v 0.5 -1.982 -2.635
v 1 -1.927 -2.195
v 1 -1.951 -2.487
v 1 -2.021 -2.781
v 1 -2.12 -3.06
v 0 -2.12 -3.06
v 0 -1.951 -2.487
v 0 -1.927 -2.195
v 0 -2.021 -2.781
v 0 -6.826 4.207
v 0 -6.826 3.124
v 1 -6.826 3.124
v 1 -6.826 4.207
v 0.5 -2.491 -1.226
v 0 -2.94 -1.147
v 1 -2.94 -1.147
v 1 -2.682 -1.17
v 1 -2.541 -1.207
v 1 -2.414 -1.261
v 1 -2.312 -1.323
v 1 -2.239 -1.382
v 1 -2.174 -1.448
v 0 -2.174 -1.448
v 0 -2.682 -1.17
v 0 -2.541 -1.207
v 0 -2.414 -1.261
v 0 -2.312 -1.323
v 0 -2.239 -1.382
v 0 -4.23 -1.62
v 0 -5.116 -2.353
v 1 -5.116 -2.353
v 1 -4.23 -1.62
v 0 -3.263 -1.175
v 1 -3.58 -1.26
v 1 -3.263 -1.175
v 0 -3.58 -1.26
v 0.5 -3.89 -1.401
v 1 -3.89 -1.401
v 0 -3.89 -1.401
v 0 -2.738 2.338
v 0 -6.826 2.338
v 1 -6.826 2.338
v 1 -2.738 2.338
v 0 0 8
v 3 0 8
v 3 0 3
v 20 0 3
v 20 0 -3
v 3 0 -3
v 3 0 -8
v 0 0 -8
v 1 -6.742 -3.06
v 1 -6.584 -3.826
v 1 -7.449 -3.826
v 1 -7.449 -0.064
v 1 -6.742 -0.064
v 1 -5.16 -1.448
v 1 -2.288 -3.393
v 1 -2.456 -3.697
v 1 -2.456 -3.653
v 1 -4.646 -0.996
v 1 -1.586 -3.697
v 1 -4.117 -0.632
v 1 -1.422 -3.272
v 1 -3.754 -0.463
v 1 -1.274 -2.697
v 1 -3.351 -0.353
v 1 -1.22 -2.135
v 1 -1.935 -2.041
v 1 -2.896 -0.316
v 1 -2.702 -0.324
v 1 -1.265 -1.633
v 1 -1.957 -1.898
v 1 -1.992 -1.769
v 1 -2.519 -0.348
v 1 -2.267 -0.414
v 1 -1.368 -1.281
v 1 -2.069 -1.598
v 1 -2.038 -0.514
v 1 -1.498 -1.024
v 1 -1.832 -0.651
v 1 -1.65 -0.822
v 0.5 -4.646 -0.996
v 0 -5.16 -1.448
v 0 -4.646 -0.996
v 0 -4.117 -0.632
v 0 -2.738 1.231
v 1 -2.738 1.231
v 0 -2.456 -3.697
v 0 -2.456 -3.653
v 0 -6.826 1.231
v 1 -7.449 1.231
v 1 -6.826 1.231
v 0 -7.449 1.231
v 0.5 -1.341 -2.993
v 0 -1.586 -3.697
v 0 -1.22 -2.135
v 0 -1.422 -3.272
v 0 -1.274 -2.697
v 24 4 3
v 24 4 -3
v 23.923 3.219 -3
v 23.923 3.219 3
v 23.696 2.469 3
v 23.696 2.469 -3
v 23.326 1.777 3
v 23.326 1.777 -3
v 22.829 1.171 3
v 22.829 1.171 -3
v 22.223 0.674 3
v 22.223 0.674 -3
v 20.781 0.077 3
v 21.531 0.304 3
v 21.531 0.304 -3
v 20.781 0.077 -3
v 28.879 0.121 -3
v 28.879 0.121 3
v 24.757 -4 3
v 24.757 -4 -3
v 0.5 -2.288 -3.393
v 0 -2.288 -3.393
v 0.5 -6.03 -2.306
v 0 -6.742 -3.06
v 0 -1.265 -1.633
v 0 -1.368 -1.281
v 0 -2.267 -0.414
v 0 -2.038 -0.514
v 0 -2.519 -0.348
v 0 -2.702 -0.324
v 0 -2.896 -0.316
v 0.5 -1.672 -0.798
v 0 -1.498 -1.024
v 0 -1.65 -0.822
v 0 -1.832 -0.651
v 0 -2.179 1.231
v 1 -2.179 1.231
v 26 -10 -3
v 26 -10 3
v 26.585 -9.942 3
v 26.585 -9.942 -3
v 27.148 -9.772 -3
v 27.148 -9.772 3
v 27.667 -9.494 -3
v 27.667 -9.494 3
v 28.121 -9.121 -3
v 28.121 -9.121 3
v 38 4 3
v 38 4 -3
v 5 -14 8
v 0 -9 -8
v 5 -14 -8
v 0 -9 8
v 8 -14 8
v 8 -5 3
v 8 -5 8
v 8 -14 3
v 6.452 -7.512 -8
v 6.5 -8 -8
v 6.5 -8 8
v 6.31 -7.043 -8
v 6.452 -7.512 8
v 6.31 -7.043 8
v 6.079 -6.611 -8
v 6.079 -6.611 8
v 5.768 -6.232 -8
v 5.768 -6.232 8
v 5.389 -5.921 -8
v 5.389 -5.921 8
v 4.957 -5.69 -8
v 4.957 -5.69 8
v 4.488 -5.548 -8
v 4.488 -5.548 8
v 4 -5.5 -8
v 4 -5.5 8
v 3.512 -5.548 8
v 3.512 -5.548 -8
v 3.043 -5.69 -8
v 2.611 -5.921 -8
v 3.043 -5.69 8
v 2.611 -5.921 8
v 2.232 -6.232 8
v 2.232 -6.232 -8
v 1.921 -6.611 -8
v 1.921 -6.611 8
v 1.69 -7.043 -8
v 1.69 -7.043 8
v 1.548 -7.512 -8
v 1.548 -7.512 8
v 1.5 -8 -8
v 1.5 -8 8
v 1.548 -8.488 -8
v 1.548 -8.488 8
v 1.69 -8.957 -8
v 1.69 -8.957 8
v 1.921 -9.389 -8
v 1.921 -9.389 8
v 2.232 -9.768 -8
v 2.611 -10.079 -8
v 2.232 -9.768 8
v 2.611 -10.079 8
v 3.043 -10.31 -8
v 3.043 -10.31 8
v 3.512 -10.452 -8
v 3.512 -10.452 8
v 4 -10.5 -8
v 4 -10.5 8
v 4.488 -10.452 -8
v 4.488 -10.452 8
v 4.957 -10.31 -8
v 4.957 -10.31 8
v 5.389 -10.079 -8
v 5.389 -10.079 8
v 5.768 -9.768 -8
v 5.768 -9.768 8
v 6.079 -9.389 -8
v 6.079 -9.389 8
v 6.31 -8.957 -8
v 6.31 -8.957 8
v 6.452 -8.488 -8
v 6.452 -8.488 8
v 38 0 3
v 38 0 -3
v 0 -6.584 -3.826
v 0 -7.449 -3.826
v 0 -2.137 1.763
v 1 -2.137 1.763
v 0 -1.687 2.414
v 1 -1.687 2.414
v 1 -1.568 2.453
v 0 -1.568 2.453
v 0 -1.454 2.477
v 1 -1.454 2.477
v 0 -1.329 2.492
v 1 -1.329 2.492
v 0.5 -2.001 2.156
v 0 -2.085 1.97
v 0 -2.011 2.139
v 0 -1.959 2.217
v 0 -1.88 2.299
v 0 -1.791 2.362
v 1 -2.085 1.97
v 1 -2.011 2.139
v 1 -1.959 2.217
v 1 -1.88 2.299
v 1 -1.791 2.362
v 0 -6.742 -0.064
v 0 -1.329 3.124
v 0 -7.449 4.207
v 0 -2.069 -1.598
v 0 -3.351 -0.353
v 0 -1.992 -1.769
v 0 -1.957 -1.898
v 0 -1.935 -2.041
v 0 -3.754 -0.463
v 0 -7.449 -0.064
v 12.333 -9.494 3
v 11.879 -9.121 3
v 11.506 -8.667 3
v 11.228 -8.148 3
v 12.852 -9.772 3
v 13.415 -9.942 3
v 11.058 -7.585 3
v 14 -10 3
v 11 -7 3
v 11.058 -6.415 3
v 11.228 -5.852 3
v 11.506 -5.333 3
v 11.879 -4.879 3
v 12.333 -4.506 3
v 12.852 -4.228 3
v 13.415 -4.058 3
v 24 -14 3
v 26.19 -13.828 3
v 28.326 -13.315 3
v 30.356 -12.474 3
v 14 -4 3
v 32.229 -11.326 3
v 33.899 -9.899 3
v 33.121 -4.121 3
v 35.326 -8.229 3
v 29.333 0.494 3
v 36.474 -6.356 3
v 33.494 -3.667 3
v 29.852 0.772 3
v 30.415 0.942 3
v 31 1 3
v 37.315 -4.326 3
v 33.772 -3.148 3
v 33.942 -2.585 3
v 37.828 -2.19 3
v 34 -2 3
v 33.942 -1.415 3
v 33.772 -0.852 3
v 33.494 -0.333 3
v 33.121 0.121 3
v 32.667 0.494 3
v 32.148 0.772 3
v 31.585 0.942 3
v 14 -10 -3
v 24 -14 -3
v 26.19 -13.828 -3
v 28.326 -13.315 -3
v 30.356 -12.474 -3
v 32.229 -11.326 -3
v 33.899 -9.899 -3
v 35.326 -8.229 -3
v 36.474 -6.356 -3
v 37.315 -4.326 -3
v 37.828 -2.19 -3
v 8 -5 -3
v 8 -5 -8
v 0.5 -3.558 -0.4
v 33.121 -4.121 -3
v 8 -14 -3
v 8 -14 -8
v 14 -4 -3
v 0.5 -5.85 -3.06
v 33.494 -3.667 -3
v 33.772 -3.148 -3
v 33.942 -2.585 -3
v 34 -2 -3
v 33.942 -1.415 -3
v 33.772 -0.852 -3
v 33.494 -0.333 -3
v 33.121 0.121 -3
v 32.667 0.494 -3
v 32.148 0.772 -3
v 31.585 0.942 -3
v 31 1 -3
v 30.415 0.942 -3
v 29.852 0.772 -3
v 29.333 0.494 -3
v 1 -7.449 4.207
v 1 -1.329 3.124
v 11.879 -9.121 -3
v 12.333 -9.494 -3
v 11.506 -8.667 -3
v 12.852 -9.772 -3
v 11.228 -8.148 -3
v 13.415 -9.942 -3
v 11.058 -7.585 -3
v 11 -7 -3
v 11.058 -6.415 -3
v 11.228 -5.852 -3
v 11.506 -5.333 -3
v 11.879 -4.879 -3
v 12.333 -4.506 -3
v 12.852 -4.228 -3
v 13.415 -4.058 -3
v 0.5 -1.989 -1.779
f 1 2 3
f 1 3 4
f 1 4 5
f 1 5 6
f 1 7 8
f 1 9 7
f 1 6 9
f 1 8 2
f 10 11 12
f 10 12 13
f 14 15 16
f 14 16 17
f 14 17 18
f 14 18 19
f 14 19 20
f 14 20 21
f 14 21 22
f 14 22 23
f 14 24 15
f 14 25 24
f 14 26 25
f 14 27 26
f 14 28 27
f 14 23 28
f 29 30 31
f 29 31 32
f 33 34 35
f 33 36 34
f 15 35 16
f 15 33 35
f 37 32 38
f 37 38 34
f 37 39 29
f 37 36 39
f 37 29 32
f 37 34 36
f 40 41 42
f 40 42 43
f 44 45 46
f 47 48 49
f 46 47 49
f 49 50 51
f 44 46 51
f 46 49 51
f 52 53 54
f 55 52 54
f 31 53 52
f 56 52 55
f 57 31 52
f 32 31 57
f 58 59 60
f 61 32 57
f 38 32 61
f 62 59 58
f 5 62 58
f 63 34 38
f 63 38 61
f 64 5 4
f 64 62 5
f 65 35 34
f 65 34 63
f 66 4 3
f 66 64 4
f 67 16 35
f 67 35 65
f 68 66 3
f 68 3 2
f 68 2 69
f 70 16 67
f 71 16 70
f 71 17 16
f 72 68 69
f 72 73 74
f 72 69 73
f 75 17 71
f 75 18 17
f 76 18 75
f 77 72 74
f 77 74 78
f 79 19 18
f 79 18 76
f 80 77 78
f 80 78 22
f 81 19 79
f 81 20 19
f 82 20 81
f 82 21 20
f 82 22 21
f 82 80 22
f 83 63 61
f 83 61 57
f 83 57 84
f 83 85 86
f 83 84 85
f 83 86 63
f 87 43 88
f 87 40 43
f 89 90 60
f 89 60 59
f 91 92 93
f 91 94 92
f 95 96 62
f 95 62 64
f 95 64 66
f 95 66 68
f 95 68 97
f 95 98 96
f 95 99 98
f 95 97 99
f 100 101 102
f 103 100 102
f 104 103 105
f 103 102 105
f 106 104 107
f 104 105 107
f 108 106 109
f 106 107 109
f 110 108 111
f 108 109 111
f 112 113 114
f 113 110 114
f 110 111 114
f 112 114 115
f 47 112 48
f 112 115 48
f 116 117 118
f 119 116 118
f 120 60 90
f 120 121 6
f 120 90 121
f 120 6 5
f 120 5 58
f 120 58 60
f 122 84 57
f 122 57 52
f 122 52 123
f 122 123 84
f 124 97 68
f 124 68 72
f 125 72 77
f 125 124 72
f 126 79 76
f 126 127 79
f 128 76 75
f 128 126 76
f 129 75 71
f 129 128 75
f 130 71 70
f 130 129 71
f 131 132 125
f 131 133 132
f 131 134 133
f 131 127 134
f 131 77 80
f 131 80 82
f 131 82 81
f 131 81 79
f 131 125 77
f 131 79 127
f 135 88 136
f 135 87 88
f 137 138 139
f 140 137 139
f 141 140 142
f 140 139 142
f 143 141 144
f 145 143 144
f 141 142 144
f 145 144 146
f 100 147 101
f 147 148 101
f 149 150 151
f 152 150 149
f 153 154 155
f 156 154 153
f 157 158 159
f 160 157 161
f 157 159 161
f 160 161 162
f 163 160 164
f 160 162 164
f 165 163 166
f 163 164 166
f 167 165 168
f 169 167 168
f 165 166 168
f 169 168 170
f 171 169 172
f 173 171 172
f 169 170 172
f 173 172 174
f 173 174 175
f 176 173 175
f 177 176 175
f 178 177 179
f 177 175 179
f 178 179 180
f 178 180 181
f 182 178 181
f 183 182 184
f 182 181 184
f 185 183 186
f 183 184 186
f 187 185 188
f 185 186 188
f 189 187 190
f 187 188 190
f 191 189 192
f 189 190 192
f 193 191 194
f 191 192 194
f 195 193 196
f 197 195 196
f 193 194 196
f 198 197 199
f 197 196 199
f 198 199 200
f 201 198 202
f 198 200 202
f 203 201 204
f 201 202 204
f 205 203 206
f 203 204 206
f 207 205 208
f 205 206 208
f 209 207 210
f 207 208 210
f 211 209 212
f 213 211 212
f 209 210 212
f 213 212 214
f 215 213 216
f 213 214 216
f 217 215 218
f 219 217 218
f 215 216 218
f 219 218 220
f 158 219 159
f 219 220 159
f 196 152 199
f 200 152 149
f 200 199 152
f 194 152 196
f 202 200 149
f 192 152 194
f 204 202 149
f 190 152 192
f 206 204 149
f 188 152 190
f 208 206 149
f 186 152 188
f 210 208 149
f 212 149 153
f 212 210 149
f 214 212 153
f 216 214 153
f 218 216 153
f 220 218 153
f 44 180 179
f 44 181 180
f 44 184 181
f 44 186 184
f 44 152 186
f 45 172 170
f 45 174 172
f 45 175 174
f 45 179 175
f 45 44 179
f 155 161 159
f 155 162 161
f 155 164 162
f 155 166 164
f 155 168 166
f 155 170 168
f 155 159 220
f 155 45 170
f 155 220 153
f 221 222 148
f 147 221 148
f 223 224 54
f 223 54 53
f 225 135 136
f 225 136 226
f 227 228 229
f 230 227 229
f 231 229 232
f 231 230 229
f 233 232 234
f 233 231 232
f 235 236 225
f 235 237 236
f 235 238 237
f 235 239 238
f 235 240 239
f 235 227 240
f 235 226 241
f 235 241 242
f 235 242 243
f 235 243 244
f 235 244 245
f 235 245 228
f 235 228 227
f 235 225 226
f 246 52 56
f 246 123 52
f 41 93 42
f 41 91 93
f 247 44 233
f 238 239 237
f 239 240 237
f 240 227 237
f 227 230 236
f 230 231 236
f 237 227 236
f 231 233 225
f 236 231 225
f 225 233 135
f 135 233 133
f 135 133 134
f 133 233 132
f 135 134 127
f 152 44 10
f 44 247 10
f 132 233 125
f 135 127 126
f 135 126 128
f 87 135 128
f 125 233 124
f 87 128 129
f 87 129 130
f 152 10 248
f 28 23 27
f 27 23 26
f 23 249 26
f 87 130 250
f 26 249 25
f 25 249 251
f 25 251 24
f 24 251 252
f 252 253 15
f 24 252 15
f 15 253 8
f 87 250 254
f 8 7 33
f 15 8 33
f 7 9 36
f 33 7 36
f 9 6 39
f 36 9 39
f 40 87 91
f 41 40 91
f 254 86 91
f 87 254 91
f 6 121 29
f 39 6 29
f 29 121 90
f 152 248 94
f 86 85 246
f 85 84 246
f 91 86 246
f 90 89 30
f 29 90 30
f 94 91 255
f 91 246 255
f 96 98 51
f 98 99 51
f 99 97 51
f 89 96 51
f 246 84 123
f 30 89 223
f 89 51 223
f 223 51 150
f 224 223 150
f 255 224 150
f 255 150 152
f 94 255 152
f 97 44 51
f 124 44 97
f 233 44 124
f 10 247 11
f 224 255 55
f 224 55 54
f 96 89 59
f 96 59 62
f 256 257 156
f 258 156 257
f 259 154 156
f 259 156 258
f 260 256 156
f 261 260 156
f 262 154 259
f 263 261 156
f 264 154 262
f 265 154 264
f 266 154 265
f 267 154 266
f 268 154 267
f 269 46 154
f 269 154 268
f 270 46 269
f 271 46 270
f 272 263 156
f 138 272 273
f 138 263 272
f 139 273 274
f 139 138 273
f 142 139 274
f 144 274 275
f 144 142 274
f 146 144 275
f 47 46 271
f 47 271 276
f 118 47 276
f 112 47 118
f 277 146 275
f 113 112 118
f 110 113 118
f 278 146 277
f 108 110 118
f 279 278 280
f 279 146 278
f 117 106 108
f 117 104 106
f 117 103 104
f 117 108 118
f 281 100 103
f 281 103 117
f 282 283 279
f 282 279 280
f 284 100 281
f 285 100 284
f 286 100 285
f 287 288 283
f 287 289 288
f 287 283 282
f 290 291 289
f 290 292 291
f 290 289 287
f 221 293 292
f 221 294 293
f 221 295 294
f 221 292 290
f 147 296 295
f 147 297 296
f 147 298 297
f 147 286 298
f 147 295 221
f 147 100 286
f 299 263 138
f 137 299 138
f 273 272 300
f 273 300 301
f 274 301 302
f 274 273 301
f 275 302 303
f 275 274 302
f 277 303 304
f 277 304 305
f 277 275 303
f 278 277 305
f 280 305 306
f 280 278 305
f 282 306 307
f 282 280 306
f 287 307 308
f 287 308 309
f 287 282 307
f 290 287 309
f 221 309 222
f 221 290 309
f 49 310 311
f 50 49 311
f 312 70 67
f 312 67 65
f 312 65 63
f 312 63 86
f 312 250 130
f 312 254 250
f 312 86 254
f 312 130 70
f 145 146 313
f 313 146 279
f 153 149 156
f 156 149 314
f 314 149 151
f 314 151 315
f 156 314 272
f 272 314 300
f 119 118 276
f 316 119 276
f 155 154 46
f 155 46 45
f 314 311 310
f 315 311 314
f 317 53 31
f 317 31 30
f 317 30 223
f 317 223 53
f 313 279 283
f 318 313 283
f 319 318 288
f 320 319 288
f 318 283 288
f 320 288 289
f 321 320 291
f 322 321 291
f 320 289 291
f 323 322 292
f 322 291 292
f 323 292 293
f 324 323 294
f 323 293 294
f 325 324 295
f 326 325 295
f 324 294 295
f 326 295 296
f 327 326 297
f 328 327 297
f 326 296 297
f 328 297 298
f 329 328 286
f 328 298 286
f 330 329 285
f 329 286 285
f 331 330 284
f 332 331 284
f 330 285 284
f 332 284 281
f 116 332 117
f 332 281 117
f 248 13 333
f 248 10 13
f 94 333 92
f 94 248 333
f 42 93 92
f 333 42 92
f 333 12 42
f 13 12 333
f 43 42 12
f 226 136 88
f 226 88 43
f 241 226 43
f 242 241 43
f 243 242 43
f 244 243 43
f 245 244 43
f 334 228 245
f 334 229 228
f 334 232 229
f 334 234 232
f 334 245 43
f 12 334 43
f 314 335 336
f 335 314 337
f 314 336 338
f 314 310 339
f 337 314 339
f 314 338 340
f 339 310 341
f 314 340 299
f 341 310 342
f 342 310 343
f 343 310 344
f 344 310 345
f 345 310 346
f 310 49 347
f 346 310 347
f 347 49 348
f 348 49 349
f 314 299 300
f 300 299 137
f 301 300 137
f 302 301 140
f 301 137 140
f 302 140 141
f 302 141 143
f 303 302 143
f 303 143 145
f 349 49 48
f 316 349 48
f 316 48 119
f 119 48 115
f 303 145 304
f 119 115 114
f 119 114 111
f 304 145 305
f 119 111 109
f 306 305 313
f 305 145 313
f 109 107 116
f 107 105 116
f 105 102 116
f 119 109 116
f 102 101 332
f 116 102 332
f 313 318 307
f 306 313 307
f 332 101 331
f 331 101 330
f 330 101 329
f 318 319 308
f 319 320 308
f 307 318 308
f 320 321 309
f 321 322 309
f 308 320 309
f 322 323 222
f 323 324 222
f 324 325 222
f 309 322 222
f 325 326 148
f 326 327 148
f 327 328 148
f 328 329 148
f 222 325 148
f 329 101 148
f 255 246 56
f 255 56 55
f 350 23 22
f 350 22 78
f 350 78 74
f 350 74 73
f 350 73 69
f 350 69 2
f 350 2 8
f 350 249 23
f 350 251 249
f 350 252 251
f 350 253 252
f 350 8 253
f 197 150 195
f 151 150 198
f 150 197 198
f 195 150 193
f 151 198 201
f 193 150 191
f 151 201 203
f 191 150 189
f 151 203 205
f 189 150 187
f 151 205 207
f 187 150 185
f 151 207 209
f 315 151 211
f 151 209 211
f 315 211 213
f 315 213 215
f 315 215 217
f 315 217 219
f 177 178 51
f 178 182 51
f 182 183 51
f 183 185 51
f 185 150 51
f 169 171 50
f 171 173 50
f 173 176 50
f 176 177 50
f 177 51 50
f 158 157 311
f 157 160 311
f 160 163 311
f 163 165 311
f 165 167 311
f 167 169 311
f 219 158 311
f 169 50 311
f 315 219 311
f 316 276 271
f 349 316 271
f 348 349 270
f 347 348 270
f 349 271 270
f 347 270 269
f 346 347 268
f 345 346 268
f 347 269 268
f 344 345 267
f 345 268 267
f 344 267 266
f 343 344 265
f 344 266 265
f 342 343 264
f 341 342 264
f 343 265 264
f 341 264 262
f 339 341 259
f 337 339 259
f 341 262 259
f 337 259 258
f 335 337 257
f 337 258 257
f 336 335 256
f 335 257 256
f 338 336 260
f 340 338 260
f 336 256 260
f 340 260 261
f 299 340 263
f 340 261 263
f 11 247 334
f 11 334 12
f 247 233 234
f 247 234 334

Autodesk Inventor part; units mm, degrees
ref_plane "YZ Plane" through (0, 0, 0) normal (1, 0, 0) x (0, 1, 0)
ref_plane "XZ Plane" through (0, 0, 0) normal (0, 1, 0) x (-1, 0, 0)
ref_plane "XY Plane" through (0, 0, 0) normal (0, 0, 1) x (1, 0, 0)
sketch "스케치1" plane through (0, 0, 0) normal (0, 0, 1) x (1, 0, 0)
  line L0 (0, 0) -> (0, -14)
  line L1 (0, -14) -> (38, -14)
  line L2 (38, -14) -> (38, 4)
  line L3 (38, 4) -> (24, 4)
  line L4 (24, 4) -> (24, 0)
  line L5 (24, 0) -> (0, 0)
  line L6 (8, 0) -> (8, -14)
  dimension "d0" = 18
  dimension "d1" = 38
  dimension "d2" = 14
  dimension "d3" = 14
  dimension "d4" = 8
extrude "돌출1" add sketch "스케치1" along normal mid plane 6 contours L5 L4 L3 L2 L1 L6
extrude "돌출2" add sketch "스케치1" along normal mid plane 16 contours L5 L6 L1 L0
fillet "모깎기1" radius 4 1 edges at (24, 0, 0)
fillet "모깎기2" radius 14 1 edges at (38, -14, 0)
chamfer "모따기1" distance 5 angle 45 1 edges at (0, -14, 0)
chamfer "모따기2" distance 5 angle 45 1 edges at (8, 0, 5.5)
chamfer "모따기3" distance 5 angle 45 1 edges at (8, 0, -5.5)
sketch "스케치2" plane through (0, 0, 8) normal (0, 0, 1) x (1, 0, 0)
  circle A0 centre (4, -8) radius 2.5
  line L0 (0, 0) -> (0, -9) projected
  line L1 (5, -14) -> (8, -14) projected
  dimension "d20" = 5
  dimension "d21" = 4
  dimension "d22" = 6
sketch "스케치3" plane through (0, 0, 3) normal (0, 0, 1) x (1, 0, 0)
  line L0 (31, -2) -> (26, -7) construction
  line L1 (28.8787, 0.1213) -> (23.8787, -4.8787)
  line L2 (28.1213, -9.1213) -> (33.1213, -4.1213)
  arc A0 (33.1213, -4.1213) -> (28.8787, 0.1213) centre (31, -2) ccw
  arc A1 (23.8787, -4.8787) -> (28.1213, -9.1213) centre (26, -7) ccw
  line L3 (38, 0) -> (38, 4) projected
  line L4 (38, 4) -> (24, 4) projected
  line L5 (26, -7) -> (14, -7) construction
  line L6 (26, -4) -> (14, -4)
  line L7 (14, -10) -> (26, -10)
  arc A2 (26, -10) -> (26, -4) centre (26, -7) ccw
  arc A3 (14, -4) -> (14, -10) centre (14, -7) ccw
  point P0 (0, 0)
  point P1 (28.5, -4.5)
  point P2 (20, -7)
  point P3 (24.7574, -4)
  dimension "d23" = 6
  dimension "d24" = 45
  dimension "d25" = 7
  dimension "d26" = 6
  dimension "d27" = 6
  dimension "d28" = 24
  dimension "d29" = 5
extrude "돌출3" cut sketch "스케치3" against normal blind 16
extrude "돌출4" cut sketch "스케치2" against normal blind 16
sketch "스케치4" plane through (0, 0, -8) normal (-1, 0, 0) x (0, 0, 1)
  line L0 (3.7292, -1.2202) -> (13.2257, -1.2202) construction
  line L1 (13.2257, -1.2202) -> (13.2257, -8.3293) construction
  line L2 (13.2257, -8.3293) -> (3.7292, -8.3293) construction
  line L3 (3.7292, -8.3293) -> (3.7292, -1.2202) construction
  line L4 (7.936, -7.4487) -> (4.1741, -7.4487)
  line L5 (4.1741, -7.4487) -> (4.1741, -6.5837)
  spline S0 degree 2 poles (4.1741, -6.5837) (4.5795, -6.203) (5.3012, -5.4961) (5.6472, -5.1155) knots 0 0 0 1 2 2 2
  spline S1 degree 2 poles (5.6472, -5.1155) (6.3442, -4.3493) (6.8534, -3.4299) (6.8534, -2.9405) knots 0 0 0 1 2 2 2
  spline S2 degree 2 poles (6.8534, -2.9405) (6.8534, -2.6834) (6.6952, -2.2979) (6.5518, -2.1743) knots 0 0 0 1 2 2 2
  spline S3 degree 2 poles (6.5518, -2.1743) (6.4085, -2.0507) (6.0328, -1.9271) (5.8054, -1.9271) knots 0 0 0 1 2 2 2
  spline S4 degree 2 poles (5.8054, -1.9271) (5.5879, -1.9271) (5.143, -2.0359) (4.9403, -2.1199) knots 0 0 0 1 2 2 2
  spline S5 degree 2 poles (4.9403, -2.1199) (4.7673, -2.1891) (4.446, -2.3868) (4.3471, -2.456) knots 0 0 0 1 2 2 2
  line L6 (4.3471, -2.456) -> (4.3027, -2.456)
  line L7 (4.3027, -2.456) -> (4.3027, -1.586)
  spline S6 degree 2 poles (4.3027, -1.586) (4.5548, -1.4624) (5.4594, -1.2202) (5.8647, -1.2202) knots 0 0 0 1 2 2 2
  spline S7 degree 2 poles (5.8647, -1.2202) (6.7199, -1.2202) (7.6839, -2.1248) (7.6839, -2.896) knots 0 0 0 1 2 2 2
  spline S8 degree 2 poles (7.6839, -2.896) (7.6839, -3.2568) (7.5158, -3.8599) (7.3675, -4.117) knots 0 0 0 1 2 2 2
  spline S9 degree 2 poles (7.3675, -4.117) (7.2192, -4.3839) (6.7891, -4.9079) (6.5518, -5.16) knots 0 0 0 1 2 2 2
  spline S10 degree 2 poles (6.5518, -5.16) (6.1663, -5.5802) (5.2221, -6.4799) (4.9403, -6.7419) knots 0 0 0 1 2 2 2
  line L8 (4.9403, -6.7419) -> (7.936, -6.7419)
  line L9 (7.936, -6.7419) -> (7.936, -7.4487)
  line L10 (12.207, -7.4487) -> (9.2311, -7.4487)
  line L11 (9.2311, -7.4487) -> (9.2311, -6.8259)
  line L12 (9.2311, -6.8259) -> (10.3384, -6.8259)
  line L13 (10.3384, -6.8259) -> (10.3384, -2.7378)
  line L14 (10.3384, -2.7378) -> (9.2311, -2.7378)
  line L15 (9.2311, -2.7378) -> (9.2311, -2.1792)
  spline S11 degree 2 poles (9.2311, -2.1792) (9.8589, -2.1792) (10.4521, -1.8233) (10.4916, -1.329) knots 0 0 0 1 2 2 2
  line L16 (10.4916, -1.329) -> (11.1244, -1.329)
  line L17 (11.1244, -1.329) -> (11.1244, -6.8259)
  line L18 (11.1244, -6.8259) -> (12.207, -6.8259)
  line L19 (12.207, -6.8259) -> (12.207, -7.4487)
  point P0 (8, 0)
extrude "돌출5" cut sketch "스케치4" against normal blind 1
properties part number "1번부품"
